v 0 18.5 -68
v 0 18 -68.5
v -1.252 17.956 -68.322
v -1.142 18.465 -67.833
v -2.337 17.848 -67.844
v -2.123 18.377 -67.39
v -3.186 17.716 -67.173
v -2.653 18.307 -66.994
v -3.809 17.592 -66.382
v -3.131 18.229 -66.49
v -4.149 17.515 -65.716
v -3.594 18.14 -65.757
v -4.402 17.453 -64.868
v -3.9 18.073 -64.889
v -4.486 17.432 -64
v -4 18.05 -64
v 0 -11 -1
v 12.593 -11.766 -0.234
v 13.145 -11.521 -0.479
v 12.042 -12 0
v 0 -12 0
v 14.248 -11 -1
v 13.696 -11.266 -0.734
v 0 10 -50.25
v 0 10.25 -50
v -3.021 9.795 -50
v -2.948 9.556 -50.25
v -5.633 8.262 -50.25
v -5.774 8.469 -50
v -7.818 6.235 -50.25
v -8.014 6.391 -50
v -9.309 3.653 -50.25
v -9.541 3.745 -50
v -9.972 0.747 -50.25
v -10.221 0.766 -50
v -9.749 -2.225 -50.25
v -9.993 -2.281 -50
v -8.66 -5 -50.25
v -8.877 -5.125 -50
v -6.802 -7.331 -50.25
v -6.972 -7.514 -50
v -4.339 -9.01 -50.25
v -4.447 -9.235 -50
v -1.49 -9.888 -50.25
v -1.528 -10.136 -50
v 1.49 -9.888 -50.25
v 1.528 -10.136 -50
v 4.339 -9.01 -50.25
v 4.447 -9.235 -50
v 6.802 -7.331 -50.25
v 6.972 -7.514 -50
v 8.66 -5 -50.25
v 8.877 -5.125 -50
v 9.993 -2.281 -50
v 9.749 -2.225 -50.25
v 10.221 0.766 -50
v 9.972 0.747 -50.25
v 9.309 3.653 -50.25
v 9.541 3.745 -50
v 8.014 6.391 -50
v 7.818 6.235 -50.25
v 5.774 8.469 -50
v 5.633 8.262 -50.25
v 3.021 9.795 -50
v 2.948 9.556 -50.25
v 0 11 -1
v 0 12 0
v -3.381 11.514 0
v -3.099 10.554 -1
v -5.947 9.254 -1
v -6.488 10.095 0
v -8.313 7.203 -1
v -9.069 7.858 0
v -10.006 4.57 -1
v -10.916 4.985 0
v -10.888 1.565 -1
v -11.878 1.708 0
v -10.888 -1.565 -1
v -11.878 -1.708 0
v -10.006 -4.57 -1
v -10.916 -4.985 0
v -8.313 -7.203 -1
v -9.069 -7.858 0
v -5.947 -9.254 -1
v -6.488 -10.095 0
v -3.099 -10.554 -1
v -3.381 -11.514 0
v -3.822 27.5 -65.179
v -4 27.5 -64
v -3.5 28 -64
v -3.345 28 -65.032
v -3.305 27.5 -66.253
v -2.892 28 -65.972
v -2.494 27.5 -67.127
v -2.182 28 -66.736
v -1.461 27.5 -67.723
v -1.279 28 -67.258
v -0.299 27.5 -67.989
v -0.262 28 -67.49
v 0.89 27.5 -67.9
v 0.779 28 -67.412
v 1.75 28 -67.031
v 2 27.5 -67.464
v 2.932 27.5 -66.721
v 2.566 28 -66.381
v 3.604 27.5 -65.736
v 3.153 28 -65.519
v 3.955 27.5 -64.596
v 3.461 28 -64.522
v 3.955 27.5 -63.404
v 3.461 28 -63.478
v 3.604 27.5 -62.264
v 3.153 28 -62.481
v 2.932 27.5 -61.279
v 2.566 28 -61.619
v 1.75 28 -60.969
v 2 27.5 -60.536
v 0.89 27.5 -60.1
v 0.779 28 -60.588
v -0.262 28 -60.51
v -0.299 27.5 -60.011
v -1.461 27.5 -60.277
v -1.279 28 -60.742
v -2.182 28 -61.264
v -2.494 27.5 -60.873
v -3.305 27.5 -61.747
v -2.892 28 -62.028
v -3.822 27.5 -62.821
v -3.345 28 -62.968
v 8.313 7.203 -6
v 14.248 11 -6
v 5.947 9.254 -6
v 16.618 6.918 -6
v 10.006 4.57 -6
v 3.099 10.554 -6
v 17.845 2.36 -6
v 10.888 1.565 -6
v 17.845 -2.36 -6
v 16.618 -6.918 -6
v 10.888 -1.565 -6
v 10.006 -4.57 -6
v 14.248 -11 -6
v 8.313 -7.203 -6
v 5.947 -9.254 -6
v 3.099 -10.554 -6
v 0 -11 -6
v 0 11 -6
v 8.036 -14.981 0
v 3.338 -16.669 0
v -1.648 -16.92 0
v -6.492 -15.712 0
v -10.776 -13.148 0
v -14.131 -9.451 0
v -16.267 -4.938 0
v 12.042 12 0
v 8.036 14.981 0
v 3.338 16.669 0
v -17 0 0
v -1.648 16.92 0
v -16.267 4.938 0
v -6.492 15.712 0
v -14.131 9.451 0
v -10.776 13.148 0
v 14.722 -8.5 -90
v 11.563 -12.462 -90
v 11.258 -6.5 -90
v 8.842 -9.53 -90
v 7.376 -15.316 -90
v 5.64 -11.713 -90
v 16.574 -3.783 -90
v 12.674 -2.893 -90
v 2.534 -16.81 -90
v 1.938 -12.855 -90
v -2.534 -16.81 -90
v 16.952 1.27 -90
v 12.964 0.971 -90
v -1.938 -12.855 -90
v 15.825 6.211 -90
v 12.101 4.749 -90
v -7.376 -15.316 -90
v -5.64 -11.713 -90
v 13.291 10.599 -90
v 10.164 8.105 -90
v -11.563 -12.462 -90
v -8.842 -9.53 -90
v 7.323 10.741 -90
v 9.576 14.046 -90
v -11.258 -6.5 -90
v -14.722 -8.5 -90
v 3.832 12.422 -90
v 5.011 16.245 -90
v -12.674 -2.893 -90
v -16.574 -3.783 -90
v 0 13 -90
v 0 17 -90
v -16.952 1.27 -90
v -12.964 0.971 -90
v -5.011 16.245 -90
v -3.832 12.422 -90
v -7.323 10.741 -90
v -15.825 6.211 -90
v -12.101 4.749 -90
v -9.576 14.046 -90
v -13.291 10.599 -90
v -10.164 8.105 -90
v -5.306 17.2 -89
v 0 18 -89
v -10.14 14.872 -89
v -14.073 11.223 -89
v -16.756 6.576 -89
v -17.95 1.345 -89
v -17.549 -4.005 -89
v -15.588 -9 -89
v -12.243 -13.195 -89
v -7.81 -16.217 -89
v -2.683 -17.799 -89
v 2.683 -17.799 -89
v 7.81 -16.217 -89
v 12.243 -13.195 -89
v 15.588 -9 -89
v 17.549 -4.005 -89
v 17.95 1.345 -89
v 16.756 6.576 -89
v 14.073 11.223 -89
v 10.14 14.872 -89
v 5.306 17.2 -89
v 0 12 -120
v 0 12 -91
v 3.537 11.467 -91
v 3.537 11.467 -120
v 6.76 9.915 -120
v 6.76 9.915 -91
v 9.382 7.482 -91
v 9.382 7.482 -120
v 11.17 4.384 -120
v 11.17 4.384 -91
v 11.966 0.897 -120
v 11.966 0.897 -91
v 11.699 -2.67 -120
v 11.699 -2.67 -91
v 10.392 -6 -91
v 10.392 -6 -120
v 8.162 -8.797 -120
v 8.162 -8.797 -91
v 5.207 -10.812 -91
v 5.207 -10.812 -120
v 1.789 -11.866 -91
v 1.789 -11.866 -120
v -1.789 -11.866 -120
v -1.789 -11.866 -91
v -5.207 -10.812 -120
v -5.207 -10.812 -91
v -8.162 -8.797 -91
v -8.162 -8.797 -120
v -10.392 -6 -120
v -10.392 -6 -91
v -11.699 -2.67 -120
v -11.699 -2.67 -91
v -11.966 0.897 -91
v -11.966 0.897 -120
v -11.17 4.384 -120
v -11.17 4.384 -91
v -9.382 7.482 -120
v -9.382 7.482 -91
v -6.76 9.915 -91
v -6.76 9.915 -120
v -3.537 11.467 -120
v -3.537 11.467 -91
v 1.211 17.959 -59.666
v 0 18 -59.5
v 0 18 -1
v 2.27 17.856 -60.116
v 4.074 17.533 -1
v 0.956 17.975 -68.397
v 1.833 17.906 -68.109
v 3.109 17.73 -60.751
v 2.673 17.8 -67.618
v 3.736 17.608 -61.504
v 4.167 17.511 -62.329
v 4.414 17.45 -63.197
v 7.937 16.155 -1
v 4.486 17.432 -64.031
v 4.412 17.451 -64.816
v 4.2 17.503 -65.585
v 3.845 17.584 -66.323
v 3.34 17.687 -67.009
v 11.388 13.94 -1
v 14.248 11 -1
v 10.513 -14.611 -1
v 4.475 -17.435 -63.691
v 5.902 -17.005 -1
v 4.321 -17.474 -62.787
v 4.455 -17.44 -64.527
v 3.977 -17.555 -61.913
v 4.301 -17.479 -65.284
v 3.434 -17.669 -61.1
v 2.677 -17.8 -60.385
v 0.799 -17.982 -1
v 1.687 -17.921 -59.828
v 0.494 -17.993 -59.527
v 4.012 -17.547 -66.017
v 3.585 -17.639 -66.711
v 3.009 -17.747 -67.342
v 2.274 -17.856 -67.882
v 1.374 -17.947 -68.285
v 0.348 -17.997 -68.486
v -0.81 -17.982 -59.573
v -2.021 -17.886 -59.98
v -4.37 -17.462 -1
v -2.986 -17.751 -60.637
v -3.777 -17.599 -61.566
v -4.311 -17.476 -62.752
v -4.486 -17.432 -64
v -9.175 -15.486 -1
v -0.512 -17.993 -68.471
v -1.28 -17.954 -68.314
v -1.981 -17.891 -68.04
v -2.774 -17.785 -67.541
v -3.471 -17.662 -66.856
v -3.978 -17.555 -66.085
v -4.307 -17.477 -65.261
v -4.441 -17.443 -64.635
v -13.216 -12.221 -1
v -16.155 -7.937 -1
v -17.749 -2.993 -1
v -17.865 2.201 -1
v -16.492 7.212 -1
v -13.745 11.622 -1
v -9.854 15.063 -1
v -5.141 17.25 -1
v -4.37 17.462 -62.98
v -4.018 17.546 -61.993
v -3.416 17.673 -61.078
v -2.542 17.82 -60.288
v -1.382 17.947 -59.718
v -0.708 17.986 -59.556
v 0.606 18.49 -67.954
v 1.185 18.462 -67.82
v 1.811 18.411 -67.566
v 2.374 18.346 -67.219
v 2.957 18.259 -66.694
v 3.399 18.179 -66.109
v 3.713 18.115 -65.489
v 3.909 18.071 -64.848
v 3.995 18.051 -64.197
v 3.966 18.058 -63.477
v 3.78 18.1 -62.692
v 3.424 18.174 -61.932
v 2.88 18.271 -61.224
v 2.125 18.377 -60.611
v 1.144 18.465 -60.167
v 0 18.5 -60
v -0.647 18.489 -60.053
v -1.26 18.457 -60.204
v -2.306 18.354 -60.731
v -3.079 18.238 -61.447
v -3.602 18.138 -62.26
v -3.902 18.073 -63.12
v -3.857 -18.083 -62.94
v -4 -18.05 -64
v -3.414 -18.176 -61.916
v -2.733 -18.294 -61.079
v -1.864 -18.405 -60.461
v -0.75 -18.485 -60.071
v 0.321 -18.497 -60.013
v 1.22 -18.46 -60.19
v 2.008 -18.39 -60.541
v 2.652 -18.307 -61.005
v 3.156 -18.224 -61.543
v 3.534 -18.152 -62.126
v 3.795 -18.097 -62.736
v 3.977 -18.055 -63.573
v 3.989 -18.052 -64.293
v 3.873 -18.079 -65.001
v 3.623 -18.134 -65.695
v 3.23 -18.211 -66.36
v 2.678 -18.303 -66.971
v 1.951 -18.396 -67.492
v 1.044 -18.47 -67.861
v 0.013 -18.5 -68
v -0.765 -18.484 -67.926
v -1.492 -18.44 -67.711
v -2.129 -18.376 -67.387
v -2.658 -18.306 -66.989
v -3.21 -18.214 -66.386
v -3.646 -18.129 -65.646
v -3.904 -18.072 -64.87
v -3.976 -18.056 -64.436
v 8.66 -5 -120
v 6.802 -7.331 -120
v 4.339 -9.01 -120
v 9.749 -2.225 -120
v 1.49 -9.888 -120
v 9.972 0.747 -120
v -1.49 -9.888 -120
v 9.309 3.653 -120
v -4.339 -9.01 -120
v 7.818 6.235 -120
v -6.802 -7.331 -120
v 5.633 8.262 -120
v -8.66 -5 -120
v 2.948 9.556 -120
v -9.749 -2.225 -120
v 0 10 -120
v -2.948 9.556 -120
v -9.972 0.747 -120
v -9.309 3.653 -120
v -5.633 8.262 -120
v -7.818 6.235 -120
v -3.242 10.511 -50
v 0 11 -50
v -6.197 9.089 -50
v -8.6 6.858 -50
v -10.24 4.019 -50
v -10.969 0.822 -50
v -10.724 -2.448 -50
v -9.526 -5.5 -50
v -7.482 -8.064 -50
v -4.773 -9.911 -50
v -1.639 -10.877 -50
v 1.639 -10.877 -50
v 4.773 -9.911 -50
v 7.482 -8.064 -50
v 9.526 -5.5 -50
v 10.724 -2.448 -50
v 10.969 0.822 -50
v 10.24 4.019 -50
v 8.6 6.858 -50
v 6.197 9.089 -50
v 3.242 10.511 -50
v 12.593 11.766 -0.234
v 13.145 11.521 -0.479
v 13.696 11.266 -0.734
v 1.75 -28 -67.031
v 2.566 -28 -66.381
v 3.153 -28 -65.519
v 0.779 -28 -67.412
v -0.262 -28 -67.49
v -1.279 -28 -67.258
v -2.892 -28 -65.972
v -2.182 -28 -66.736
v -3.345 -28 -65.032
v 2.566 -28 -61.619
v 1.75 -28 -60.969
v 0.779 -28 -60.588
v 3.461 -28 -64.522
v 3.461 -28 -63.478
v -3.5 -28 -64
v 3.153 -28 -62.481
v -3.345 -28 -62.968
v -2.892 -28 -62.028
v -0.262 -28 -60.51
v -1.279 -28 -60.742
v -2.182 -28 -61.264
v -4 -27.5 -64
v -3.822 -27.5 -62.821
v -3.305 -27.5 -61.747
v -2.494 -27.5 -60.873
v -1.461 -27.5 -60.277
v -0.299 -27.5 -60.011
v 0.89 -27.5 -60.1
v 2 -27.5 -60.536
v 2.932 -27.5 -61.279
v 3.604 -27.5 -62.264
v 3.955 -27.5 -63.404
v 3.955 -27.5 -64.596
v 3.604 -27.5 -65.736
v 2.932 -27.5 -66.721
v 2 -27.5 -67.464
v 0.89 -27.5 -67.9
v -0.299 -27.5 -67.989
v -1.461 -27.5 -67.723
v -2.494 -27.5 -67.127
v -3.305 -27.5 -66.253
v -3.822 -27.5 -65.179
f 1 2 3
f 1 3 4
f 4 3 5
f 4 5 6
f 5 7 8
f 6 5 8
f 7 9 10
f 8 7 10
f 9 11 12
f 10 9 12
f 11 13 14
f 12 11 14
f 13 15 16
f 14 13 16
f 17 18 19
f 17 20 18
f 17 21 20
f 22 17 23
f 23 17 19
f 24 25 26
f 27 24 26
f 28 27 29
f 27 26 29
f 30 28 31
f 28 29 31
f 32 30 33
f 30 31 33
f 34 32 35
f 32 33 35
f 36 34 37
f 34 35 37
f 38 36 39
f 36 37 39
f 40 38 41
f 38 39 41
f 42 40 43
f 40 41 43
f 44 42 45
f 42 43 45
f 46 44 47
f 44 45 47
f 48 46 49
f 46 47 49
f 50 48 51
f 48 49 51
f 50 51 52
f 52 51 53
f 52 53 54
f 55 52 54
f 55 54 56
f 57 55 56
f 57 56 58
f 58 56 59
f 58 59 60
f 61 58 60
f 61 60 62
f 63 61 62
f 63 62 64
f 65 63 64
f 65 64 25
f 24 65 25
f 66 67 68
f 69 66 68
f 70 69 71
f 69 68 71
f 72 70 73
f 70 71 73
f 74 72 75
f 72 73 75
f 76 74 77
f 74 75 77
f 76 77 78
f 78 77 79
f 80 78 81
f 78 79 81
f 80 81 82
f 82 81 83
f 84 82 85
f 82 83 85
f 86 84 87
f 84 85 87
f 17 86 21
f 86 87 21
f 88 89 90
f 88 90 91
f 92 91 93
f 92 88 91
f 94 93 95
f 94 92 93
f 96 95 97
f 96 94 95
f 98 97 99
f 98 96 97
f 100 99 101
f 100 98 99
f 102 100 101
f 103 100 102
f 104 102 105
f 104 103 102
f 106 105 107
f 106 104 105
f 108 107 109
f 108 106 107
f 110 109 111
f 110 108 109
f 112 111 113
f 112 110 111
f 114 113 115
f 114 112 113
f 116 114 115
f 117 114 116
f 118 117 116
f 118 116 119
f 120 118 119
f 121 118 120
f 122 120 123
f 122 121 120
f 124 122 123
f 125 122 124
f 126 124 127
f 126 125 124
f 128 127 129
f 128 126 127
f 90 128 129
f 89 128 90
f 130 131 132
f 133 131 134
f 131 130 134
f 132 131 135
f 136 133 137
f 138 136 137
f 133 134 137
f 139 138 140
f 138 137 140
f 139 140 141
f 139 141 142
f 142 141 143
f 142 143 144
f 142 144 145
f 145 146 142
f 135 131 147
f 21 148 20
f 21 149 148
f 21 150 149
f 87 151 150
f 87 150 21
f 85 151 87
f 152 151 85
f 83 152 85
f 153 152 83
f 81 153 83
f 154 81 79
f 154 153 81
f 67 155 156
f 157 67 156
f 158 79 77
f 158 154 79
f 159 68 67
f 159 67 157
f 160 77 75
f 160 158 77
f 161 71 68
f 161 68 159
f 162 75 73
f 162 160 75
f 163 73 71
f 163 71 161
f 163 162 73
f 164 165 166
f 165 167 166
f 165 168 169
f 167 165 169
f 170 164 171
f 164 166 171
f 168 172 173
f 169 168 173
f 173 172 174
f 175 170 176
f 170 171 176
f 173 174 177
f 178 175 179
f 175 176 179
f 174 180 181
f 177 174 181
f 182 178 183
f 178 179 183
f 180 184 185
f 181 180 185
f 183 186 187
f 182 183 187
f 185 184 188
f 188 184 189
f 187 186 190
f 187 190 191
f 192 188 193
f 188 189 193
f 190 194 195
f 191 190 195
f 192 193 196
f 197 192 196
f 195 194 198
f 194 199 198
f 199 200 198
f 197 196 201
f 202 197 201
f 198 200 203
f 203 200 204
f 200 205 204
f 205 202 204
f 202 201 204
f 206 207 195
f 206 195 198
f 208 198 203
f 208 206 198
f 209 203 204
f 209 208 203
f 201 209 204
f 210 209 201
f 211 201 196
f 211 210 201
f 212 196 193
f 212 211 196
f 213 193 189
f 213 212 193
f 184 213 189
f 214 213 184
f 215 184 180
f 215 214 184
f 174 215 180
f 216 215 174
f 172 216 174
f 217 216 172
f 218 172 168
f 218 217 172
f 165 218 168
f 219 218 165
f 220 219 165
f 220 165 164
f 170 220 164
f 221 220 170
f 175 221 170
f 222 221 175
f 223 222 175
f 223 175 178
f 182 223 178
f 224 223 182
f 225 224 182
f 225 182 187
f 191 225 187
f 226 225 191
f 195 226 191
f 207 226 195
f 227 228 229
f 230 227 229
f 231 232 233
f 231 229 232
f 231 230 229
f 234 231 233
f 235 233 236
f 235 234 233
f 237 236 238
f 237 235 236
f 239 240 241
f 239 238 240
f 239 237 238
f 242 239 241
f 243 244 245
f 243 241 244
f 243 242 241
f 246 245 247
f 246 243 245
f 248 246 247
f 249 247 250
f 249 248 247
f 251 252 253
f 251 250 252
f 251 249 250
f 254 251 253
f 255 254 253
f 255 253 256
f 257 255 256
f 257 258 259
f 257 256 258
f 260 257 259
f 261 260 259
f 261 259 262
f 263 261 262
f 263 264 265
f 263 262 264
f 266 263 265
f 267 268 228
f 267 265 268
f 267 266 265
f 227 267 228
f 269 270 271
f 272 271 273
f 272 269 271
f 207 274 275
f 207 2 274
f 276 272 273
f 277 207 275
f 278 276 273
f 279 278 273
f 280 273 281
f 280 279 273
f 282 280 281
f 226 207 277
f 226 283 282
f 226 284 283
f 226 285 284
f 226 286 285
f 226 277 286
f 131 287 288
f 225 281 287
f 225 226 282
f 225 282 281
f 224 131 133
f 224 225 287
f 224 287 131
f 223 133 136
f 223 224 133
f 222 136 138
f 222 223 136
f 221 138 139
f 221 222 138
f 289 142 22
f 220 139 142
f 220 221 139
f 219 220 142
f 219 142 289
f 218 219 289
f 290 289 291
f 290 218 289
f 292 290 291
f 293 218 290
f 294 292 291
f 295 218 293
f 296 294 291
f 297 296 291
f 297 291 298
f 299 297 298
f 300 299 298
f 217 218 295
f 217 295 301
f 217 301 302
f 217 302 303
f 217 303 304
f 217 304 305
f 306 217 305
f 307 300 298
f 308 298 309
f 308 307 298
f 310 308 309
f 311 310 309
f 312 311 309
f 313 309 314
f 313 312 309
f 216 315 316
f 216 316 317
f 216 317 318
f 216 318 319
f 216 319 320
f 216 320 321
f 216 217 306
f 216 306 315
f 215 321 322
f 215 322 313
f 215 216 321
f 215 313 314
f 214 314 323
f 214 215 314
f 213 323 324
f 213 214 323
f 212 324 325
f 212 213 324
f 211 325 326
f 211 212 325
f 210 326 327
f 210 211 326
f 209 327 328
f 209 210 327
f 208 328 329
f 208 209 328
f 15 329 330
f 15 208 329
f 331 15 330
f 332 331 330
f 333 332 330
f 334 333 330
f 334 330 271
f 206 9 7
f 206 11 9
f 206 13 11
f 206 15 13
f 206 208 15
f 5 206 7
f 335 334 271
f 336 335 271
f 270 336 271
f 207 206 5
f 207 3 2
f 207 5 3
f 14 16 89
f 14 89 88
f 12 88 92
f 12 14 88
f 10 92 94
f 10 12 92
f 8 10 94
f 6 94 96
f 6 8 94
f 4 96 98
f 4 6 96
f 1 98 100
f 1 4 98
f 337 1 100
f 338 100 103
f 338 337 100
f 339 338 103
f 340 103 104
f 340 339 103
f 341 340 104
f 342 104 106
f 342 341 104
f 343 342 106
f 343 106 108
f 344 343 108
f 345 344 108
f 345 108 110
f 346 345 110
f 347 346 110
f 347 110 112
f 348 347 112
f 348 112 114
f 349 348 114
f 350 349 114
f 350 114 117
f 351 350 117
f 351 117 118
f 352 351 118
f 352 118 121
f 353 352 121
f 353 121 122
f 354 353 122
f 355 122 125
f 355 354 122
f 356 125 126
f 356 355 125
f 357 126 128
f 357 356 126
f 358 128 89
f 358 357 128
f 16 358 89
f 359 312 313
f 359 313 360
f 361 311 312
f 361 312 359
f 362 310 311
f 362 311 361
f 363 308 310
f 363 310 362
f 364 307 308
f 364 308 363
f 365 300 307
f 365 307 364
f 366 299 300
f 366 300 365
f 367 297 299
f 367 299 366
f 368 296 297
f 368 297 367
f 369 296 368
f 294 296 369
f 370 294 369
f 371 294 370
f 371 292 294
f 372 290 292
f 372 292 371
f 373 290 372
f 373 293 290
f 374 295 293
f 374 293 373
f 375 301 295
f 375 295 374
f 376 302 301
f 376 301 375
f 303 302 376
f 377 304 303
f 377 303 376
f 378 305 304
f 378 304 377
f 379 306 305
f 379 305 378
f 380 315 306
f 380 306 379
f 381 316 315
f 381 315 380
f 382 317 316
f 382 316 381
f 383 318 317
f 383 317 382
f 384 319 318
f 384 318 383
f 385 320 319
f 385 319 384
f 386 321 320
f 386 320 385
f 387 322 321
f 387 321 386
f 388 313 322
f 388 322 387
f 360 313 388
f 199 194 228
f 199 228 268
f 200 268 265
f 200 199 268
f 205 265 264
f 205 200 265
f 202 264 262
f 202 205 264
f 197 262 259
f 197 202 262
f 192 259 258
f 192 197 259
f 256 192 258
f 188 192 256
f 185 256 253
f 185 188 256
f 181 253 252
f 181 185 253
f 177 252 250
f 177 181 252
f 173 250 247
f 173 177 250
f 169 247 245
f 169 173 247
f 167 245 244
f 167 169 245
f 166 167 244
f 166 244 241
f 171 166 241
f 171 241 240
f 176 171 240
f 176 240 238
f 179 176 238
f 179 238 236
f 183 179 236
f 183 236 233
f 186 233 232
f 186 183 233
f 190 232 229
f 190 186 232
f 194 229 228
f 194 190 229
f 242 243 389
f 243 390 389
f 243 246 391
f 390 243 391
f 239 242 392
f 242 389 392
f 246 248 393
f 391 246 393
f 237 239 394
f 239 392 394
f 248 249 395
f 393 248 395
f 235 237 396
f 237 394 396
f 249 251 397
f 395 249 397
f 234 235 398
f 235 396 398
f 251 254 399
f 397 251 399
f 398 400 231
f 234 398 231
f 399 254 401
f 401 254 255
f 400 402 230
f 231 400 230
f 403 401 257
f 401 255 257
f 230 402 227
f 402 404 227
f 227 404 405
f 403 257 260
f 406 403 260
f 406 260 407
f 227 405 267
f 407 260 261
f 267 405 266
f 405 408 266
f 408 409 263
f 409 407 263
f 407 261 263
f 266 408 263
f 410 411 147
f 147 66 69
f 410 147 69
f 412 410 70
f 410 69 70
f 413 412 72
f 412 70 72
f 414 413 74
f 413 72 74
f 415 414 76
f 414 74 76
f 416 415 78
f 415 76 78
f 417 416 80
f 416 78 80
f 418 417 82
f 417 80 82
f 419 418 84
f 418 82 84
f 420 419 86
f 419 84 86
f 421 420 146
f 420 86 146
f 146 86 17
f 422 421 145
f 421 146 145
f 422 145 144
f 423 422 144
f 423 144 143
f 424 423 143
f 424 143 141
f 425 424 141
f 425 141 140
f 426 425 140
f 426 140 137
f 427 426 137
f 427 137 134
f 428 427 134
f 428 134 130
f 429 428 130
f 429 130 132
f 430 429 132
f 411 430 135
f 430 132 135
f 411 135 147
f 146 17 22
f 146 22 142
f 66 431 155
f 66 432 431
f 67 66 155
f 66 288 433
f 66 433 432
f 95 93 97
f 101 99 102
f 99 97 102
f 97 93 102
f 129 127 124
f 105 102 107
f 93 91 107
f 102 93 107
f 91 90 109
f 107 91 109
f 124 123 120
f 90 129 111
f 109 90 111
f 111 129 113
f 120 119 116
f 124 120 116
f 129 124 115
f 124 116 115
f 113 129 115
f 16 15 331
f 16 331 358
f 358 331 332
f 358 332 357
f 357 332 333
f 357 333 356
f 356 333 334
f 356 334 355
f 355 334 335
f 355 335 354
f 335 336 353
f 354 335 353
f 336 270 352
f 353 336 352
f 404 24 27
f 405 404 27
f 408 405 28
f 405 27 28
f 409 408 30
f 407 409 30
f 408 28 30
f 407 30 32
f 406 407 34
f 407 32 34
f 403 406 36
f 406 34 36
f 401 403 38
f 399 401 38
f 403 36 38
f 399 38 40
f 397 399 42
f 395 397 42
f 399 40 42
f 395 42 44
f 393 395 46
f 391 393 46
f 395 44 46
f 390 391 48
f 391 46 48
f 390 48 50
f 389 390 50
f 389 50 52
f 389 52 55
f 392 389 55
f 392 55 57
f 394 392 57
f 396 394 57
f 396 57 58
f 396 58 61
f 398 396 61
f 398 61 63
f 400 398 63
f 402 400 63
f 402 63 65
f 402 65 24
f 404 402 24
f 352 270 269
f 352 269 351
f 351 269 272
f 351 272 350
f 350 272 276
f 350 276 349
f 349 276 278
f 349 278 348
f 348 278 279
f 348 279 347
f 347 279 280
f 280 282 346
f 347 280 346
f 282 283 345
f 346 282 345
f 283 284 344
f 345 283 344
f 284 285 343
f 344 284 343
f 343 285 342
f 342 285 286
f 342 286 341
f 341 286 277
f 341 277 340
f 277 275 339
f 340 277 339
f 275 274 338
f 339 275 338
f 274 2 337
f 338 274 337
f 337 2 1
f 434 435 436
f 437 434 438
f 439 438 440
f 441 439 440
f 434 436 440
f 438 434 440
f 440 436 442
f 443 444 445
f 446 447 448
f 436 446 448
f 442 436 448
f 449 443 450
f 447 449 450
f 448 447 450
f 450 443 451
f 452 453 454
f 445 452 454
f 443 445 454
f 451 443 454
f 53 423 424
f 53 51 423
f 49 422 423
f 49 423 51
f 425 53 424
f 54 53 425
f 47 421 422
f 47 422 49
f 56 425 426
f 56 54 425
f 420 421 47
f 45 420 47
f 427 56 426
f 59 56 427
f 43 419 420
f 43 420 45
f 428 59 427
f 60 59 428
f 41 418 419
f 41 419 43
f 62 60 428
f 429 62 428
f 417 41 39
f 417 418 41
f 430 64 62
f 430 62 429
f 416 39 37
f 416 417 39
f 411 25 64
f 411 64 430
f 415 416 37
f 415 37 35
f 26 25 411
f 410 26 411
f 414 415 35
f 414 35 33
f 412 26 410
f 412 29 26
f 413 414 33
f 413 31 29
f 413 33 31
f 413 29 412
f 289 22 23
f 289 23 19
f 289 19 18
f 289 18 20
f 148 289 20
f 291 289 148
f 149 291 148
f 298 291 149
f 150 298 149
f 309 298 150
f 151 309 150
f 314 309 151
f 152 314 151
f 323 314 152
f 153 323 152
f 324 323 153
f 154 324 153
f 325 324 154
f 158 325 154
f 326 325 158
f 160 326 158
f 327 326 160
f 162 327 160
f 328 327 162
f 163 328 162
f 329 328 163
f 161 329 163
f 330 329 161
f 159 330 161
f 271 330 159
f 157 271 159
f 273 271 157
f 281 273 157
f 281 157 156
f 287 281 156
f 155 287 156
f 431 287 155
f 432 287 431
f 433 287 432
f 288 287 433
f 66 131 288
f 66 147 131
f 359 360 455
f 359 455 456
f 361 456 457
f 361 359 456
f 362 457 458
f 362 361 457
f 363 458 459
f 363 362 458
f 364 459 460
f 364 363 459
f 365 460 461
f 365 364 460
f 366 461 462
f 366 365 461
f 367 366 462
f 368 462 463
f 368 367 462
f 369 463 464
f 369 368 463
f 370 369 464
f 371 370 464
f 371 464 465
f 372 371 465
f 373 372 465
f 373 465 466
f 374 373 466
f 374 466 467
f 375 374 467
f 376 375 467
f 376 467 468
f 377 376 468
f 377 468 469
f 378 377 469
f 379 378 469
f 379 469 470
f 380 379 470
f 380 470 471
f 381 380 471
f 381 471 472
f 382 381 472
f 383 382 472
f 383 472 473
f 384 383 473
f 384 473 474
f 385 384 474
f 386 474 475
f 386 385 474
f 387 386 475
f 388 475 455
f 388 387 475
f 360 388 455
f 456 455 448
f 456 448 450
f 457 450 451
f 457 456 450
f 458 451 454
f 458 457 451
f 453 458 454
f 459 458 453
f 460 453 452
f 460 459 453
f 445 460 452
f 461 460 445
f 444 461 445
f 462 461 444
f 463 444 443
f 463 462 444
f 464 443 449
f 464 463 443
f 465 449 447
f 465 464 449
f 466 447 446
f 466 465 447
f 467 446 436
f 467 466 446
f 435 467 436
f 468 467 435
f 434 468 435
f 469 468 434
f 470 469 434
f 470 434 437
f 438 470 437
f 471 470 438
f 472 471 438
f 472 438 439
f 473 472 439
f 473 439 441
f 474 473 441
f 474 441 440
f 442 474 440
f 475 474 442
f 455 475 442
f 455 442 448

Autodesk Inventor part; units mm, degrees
ref_plane "YZ Plane" through (0, 0, 0) normal (1, 0, 0) x (0, 1, 0)
ref_plane "XY Plane" through (0, 0, 0) normal (0, 0, 1) x (1, 0, 0)
sketch "Esquisse3" plane through (0, 0, 0) normal (1, 0, 0) x (0, 1, 0)
  line L0 (17, 0) -> (18, -1)
  line L1 (18, -1) -> (18, -89)
  line L2 (18, -89) -> (17, -90)
  line L3 (17, -90) -> (13, -90)
  line L4 (13, -90) -> (12, -91)
  line L5 (12, -91) -> (12, -120)
  line L6 (12, -120) -> (10, -120)
  line L7 (10, -120) -> (10, -50.25)
  line L8 (11, -50) -> (11, -1)
  line L9 (11, -1) -> (12, 0)
  line L10 (12, 0) -> (17, 0)
  line L11 (0, -144) -> (0, 24) projected
  line L12 (11, -50) -> (10.25, -50)
  line L13 (10.25, -50) -> (10, -50.25)
  point P0 (0, 0)
  dimension "d4" = 1
  dimension "d5" = 1
  dimension "d6" = 11
  dimension "d7" = 10
  dimension "d8" = 1
  dimension "d9" = 1
  dimension "d10" = 18
  dimension "d11" = 50
  dimension "d12" = 40
  dimension "d13" = 1
  dimension "d14" = 1
  dimension "d16" = 1
  dimension "d17" = 1
  dimension "d18" = 30
  dimension "d20" = 0.25
  dimension "d21" = 0.25
revolve "Révolution1" add sketch "Esquisse3" angle 360 about axis through (0, 0, -10) along (0, 0, 1)
sketch "Esquisse4" plane through (0, 0, 0) normal (1, 0, 0) x (0, 1, 0)
  line L0 (18, -1) -> (18, -89) projected
  line L1 (18, -89) -> (17, -90) projected
  line L2 (17, -90) -> (13, -90) projected
  line L3 (13, -90) -> (12, -91) projected
  line L4 (12, -91) -> (12, -120) projected
  line L5 (12, -120) -> (10, -120) projected
  line L6 (10, -120) -> (10, -50.25) projected
  line L7 (10, -50.25) -> (10.25, -50) projected
  line L8 (10.25, -50) -> (11, -50) projected
  line L9 (11, -50) -> (11, -1) projected
  line L10 (11, -1) -> (12, 0) projected
  line L11 (12, 0) -> (17, 0) projected
  line L12 (17, 0) -> (18, -1) projected
  line L13 (-18, -89) -> (-18, -1) projected
  line L14 (-18, -1) -> (-17, 0) projected
  line L15 (-17, 0) -> (-12, 0) projected
  line L16 (-12, 0) -> (-11, -1) projected
  line L17 (-11, -1) -> (-11, -50) projected
  line L18 (-11, -50) -> (-10.25, -50) projected
  line L19 (-10.25, -50) -> (-10, -50.25) projected
  line L20 (-10, -50.25) -> (-10, -120) projected
  line L21 (-10, -120) -> (-12, -120) projected
  line L22 (-12, -120) -> (-12, -91) projected
  line L23 (-12, -91) -> (-13, -90) projected
  line L24 (-13, -90) -> (-17, -90) projected
  line L25 (-17, -90) -> (-18, -89) projected
  line L26 (12, 0) -> (-12, 0)
  line L27 (11, -50) -> (11, -1) projected
  line L28 (11, -6) -> (-11, -6)
  point P0 (0, 0)
  dimension "d22" = 6
extrude "Extrusion3" cut sketch "Esquisse4" along normal up to surface contours L10 L9 L28 L17 L16 L26
ref_plane "Plan de construction1" through (0, -18, -45) normal (0, 1, 0) x (-1, 0, 0)
sketch "Esquisse5" plane through (0, -18, -45) normal (0, 1, 0) x (-1, 0, 0)
  circle A0 centre (0, -19) radius 4
  line L0 (0, -99) -> (0, 69) projected
  point P0 (0, 45)
  point P1 (12.0416, 35)
  point P2 (17, 45)
  dimension "d25" = 8
  dimension "d26" = 64
extrude "Extrusion4" add sketch "Esquisse5" along normal blind 2 and the other way blind 10
chamfer "Chanfrein1" distance 0.5 angle 45 4 edges at (-3.0446, -17.7406, -61.4057) (4, -17.5499, -63.9963) (-3.0454, -17.7405, -66.5934) (4, -28, -64)
mirror "Symétrie1" about plane through (0, 0, 0) normal (0, 1, 0) of "Extrusion4", "Chanfrein1"
equation "\"d5\" = d4"
equation "\"d8\" = d4"
equation "\"d9\" = d4"
equation "\"d14\" = d13"
equation "\"d16\" = d13"
equation "\"d17\" = d13"
equation "\"d21\" = d20"
properties part number "canon" material "S235JR (E24-2)"
